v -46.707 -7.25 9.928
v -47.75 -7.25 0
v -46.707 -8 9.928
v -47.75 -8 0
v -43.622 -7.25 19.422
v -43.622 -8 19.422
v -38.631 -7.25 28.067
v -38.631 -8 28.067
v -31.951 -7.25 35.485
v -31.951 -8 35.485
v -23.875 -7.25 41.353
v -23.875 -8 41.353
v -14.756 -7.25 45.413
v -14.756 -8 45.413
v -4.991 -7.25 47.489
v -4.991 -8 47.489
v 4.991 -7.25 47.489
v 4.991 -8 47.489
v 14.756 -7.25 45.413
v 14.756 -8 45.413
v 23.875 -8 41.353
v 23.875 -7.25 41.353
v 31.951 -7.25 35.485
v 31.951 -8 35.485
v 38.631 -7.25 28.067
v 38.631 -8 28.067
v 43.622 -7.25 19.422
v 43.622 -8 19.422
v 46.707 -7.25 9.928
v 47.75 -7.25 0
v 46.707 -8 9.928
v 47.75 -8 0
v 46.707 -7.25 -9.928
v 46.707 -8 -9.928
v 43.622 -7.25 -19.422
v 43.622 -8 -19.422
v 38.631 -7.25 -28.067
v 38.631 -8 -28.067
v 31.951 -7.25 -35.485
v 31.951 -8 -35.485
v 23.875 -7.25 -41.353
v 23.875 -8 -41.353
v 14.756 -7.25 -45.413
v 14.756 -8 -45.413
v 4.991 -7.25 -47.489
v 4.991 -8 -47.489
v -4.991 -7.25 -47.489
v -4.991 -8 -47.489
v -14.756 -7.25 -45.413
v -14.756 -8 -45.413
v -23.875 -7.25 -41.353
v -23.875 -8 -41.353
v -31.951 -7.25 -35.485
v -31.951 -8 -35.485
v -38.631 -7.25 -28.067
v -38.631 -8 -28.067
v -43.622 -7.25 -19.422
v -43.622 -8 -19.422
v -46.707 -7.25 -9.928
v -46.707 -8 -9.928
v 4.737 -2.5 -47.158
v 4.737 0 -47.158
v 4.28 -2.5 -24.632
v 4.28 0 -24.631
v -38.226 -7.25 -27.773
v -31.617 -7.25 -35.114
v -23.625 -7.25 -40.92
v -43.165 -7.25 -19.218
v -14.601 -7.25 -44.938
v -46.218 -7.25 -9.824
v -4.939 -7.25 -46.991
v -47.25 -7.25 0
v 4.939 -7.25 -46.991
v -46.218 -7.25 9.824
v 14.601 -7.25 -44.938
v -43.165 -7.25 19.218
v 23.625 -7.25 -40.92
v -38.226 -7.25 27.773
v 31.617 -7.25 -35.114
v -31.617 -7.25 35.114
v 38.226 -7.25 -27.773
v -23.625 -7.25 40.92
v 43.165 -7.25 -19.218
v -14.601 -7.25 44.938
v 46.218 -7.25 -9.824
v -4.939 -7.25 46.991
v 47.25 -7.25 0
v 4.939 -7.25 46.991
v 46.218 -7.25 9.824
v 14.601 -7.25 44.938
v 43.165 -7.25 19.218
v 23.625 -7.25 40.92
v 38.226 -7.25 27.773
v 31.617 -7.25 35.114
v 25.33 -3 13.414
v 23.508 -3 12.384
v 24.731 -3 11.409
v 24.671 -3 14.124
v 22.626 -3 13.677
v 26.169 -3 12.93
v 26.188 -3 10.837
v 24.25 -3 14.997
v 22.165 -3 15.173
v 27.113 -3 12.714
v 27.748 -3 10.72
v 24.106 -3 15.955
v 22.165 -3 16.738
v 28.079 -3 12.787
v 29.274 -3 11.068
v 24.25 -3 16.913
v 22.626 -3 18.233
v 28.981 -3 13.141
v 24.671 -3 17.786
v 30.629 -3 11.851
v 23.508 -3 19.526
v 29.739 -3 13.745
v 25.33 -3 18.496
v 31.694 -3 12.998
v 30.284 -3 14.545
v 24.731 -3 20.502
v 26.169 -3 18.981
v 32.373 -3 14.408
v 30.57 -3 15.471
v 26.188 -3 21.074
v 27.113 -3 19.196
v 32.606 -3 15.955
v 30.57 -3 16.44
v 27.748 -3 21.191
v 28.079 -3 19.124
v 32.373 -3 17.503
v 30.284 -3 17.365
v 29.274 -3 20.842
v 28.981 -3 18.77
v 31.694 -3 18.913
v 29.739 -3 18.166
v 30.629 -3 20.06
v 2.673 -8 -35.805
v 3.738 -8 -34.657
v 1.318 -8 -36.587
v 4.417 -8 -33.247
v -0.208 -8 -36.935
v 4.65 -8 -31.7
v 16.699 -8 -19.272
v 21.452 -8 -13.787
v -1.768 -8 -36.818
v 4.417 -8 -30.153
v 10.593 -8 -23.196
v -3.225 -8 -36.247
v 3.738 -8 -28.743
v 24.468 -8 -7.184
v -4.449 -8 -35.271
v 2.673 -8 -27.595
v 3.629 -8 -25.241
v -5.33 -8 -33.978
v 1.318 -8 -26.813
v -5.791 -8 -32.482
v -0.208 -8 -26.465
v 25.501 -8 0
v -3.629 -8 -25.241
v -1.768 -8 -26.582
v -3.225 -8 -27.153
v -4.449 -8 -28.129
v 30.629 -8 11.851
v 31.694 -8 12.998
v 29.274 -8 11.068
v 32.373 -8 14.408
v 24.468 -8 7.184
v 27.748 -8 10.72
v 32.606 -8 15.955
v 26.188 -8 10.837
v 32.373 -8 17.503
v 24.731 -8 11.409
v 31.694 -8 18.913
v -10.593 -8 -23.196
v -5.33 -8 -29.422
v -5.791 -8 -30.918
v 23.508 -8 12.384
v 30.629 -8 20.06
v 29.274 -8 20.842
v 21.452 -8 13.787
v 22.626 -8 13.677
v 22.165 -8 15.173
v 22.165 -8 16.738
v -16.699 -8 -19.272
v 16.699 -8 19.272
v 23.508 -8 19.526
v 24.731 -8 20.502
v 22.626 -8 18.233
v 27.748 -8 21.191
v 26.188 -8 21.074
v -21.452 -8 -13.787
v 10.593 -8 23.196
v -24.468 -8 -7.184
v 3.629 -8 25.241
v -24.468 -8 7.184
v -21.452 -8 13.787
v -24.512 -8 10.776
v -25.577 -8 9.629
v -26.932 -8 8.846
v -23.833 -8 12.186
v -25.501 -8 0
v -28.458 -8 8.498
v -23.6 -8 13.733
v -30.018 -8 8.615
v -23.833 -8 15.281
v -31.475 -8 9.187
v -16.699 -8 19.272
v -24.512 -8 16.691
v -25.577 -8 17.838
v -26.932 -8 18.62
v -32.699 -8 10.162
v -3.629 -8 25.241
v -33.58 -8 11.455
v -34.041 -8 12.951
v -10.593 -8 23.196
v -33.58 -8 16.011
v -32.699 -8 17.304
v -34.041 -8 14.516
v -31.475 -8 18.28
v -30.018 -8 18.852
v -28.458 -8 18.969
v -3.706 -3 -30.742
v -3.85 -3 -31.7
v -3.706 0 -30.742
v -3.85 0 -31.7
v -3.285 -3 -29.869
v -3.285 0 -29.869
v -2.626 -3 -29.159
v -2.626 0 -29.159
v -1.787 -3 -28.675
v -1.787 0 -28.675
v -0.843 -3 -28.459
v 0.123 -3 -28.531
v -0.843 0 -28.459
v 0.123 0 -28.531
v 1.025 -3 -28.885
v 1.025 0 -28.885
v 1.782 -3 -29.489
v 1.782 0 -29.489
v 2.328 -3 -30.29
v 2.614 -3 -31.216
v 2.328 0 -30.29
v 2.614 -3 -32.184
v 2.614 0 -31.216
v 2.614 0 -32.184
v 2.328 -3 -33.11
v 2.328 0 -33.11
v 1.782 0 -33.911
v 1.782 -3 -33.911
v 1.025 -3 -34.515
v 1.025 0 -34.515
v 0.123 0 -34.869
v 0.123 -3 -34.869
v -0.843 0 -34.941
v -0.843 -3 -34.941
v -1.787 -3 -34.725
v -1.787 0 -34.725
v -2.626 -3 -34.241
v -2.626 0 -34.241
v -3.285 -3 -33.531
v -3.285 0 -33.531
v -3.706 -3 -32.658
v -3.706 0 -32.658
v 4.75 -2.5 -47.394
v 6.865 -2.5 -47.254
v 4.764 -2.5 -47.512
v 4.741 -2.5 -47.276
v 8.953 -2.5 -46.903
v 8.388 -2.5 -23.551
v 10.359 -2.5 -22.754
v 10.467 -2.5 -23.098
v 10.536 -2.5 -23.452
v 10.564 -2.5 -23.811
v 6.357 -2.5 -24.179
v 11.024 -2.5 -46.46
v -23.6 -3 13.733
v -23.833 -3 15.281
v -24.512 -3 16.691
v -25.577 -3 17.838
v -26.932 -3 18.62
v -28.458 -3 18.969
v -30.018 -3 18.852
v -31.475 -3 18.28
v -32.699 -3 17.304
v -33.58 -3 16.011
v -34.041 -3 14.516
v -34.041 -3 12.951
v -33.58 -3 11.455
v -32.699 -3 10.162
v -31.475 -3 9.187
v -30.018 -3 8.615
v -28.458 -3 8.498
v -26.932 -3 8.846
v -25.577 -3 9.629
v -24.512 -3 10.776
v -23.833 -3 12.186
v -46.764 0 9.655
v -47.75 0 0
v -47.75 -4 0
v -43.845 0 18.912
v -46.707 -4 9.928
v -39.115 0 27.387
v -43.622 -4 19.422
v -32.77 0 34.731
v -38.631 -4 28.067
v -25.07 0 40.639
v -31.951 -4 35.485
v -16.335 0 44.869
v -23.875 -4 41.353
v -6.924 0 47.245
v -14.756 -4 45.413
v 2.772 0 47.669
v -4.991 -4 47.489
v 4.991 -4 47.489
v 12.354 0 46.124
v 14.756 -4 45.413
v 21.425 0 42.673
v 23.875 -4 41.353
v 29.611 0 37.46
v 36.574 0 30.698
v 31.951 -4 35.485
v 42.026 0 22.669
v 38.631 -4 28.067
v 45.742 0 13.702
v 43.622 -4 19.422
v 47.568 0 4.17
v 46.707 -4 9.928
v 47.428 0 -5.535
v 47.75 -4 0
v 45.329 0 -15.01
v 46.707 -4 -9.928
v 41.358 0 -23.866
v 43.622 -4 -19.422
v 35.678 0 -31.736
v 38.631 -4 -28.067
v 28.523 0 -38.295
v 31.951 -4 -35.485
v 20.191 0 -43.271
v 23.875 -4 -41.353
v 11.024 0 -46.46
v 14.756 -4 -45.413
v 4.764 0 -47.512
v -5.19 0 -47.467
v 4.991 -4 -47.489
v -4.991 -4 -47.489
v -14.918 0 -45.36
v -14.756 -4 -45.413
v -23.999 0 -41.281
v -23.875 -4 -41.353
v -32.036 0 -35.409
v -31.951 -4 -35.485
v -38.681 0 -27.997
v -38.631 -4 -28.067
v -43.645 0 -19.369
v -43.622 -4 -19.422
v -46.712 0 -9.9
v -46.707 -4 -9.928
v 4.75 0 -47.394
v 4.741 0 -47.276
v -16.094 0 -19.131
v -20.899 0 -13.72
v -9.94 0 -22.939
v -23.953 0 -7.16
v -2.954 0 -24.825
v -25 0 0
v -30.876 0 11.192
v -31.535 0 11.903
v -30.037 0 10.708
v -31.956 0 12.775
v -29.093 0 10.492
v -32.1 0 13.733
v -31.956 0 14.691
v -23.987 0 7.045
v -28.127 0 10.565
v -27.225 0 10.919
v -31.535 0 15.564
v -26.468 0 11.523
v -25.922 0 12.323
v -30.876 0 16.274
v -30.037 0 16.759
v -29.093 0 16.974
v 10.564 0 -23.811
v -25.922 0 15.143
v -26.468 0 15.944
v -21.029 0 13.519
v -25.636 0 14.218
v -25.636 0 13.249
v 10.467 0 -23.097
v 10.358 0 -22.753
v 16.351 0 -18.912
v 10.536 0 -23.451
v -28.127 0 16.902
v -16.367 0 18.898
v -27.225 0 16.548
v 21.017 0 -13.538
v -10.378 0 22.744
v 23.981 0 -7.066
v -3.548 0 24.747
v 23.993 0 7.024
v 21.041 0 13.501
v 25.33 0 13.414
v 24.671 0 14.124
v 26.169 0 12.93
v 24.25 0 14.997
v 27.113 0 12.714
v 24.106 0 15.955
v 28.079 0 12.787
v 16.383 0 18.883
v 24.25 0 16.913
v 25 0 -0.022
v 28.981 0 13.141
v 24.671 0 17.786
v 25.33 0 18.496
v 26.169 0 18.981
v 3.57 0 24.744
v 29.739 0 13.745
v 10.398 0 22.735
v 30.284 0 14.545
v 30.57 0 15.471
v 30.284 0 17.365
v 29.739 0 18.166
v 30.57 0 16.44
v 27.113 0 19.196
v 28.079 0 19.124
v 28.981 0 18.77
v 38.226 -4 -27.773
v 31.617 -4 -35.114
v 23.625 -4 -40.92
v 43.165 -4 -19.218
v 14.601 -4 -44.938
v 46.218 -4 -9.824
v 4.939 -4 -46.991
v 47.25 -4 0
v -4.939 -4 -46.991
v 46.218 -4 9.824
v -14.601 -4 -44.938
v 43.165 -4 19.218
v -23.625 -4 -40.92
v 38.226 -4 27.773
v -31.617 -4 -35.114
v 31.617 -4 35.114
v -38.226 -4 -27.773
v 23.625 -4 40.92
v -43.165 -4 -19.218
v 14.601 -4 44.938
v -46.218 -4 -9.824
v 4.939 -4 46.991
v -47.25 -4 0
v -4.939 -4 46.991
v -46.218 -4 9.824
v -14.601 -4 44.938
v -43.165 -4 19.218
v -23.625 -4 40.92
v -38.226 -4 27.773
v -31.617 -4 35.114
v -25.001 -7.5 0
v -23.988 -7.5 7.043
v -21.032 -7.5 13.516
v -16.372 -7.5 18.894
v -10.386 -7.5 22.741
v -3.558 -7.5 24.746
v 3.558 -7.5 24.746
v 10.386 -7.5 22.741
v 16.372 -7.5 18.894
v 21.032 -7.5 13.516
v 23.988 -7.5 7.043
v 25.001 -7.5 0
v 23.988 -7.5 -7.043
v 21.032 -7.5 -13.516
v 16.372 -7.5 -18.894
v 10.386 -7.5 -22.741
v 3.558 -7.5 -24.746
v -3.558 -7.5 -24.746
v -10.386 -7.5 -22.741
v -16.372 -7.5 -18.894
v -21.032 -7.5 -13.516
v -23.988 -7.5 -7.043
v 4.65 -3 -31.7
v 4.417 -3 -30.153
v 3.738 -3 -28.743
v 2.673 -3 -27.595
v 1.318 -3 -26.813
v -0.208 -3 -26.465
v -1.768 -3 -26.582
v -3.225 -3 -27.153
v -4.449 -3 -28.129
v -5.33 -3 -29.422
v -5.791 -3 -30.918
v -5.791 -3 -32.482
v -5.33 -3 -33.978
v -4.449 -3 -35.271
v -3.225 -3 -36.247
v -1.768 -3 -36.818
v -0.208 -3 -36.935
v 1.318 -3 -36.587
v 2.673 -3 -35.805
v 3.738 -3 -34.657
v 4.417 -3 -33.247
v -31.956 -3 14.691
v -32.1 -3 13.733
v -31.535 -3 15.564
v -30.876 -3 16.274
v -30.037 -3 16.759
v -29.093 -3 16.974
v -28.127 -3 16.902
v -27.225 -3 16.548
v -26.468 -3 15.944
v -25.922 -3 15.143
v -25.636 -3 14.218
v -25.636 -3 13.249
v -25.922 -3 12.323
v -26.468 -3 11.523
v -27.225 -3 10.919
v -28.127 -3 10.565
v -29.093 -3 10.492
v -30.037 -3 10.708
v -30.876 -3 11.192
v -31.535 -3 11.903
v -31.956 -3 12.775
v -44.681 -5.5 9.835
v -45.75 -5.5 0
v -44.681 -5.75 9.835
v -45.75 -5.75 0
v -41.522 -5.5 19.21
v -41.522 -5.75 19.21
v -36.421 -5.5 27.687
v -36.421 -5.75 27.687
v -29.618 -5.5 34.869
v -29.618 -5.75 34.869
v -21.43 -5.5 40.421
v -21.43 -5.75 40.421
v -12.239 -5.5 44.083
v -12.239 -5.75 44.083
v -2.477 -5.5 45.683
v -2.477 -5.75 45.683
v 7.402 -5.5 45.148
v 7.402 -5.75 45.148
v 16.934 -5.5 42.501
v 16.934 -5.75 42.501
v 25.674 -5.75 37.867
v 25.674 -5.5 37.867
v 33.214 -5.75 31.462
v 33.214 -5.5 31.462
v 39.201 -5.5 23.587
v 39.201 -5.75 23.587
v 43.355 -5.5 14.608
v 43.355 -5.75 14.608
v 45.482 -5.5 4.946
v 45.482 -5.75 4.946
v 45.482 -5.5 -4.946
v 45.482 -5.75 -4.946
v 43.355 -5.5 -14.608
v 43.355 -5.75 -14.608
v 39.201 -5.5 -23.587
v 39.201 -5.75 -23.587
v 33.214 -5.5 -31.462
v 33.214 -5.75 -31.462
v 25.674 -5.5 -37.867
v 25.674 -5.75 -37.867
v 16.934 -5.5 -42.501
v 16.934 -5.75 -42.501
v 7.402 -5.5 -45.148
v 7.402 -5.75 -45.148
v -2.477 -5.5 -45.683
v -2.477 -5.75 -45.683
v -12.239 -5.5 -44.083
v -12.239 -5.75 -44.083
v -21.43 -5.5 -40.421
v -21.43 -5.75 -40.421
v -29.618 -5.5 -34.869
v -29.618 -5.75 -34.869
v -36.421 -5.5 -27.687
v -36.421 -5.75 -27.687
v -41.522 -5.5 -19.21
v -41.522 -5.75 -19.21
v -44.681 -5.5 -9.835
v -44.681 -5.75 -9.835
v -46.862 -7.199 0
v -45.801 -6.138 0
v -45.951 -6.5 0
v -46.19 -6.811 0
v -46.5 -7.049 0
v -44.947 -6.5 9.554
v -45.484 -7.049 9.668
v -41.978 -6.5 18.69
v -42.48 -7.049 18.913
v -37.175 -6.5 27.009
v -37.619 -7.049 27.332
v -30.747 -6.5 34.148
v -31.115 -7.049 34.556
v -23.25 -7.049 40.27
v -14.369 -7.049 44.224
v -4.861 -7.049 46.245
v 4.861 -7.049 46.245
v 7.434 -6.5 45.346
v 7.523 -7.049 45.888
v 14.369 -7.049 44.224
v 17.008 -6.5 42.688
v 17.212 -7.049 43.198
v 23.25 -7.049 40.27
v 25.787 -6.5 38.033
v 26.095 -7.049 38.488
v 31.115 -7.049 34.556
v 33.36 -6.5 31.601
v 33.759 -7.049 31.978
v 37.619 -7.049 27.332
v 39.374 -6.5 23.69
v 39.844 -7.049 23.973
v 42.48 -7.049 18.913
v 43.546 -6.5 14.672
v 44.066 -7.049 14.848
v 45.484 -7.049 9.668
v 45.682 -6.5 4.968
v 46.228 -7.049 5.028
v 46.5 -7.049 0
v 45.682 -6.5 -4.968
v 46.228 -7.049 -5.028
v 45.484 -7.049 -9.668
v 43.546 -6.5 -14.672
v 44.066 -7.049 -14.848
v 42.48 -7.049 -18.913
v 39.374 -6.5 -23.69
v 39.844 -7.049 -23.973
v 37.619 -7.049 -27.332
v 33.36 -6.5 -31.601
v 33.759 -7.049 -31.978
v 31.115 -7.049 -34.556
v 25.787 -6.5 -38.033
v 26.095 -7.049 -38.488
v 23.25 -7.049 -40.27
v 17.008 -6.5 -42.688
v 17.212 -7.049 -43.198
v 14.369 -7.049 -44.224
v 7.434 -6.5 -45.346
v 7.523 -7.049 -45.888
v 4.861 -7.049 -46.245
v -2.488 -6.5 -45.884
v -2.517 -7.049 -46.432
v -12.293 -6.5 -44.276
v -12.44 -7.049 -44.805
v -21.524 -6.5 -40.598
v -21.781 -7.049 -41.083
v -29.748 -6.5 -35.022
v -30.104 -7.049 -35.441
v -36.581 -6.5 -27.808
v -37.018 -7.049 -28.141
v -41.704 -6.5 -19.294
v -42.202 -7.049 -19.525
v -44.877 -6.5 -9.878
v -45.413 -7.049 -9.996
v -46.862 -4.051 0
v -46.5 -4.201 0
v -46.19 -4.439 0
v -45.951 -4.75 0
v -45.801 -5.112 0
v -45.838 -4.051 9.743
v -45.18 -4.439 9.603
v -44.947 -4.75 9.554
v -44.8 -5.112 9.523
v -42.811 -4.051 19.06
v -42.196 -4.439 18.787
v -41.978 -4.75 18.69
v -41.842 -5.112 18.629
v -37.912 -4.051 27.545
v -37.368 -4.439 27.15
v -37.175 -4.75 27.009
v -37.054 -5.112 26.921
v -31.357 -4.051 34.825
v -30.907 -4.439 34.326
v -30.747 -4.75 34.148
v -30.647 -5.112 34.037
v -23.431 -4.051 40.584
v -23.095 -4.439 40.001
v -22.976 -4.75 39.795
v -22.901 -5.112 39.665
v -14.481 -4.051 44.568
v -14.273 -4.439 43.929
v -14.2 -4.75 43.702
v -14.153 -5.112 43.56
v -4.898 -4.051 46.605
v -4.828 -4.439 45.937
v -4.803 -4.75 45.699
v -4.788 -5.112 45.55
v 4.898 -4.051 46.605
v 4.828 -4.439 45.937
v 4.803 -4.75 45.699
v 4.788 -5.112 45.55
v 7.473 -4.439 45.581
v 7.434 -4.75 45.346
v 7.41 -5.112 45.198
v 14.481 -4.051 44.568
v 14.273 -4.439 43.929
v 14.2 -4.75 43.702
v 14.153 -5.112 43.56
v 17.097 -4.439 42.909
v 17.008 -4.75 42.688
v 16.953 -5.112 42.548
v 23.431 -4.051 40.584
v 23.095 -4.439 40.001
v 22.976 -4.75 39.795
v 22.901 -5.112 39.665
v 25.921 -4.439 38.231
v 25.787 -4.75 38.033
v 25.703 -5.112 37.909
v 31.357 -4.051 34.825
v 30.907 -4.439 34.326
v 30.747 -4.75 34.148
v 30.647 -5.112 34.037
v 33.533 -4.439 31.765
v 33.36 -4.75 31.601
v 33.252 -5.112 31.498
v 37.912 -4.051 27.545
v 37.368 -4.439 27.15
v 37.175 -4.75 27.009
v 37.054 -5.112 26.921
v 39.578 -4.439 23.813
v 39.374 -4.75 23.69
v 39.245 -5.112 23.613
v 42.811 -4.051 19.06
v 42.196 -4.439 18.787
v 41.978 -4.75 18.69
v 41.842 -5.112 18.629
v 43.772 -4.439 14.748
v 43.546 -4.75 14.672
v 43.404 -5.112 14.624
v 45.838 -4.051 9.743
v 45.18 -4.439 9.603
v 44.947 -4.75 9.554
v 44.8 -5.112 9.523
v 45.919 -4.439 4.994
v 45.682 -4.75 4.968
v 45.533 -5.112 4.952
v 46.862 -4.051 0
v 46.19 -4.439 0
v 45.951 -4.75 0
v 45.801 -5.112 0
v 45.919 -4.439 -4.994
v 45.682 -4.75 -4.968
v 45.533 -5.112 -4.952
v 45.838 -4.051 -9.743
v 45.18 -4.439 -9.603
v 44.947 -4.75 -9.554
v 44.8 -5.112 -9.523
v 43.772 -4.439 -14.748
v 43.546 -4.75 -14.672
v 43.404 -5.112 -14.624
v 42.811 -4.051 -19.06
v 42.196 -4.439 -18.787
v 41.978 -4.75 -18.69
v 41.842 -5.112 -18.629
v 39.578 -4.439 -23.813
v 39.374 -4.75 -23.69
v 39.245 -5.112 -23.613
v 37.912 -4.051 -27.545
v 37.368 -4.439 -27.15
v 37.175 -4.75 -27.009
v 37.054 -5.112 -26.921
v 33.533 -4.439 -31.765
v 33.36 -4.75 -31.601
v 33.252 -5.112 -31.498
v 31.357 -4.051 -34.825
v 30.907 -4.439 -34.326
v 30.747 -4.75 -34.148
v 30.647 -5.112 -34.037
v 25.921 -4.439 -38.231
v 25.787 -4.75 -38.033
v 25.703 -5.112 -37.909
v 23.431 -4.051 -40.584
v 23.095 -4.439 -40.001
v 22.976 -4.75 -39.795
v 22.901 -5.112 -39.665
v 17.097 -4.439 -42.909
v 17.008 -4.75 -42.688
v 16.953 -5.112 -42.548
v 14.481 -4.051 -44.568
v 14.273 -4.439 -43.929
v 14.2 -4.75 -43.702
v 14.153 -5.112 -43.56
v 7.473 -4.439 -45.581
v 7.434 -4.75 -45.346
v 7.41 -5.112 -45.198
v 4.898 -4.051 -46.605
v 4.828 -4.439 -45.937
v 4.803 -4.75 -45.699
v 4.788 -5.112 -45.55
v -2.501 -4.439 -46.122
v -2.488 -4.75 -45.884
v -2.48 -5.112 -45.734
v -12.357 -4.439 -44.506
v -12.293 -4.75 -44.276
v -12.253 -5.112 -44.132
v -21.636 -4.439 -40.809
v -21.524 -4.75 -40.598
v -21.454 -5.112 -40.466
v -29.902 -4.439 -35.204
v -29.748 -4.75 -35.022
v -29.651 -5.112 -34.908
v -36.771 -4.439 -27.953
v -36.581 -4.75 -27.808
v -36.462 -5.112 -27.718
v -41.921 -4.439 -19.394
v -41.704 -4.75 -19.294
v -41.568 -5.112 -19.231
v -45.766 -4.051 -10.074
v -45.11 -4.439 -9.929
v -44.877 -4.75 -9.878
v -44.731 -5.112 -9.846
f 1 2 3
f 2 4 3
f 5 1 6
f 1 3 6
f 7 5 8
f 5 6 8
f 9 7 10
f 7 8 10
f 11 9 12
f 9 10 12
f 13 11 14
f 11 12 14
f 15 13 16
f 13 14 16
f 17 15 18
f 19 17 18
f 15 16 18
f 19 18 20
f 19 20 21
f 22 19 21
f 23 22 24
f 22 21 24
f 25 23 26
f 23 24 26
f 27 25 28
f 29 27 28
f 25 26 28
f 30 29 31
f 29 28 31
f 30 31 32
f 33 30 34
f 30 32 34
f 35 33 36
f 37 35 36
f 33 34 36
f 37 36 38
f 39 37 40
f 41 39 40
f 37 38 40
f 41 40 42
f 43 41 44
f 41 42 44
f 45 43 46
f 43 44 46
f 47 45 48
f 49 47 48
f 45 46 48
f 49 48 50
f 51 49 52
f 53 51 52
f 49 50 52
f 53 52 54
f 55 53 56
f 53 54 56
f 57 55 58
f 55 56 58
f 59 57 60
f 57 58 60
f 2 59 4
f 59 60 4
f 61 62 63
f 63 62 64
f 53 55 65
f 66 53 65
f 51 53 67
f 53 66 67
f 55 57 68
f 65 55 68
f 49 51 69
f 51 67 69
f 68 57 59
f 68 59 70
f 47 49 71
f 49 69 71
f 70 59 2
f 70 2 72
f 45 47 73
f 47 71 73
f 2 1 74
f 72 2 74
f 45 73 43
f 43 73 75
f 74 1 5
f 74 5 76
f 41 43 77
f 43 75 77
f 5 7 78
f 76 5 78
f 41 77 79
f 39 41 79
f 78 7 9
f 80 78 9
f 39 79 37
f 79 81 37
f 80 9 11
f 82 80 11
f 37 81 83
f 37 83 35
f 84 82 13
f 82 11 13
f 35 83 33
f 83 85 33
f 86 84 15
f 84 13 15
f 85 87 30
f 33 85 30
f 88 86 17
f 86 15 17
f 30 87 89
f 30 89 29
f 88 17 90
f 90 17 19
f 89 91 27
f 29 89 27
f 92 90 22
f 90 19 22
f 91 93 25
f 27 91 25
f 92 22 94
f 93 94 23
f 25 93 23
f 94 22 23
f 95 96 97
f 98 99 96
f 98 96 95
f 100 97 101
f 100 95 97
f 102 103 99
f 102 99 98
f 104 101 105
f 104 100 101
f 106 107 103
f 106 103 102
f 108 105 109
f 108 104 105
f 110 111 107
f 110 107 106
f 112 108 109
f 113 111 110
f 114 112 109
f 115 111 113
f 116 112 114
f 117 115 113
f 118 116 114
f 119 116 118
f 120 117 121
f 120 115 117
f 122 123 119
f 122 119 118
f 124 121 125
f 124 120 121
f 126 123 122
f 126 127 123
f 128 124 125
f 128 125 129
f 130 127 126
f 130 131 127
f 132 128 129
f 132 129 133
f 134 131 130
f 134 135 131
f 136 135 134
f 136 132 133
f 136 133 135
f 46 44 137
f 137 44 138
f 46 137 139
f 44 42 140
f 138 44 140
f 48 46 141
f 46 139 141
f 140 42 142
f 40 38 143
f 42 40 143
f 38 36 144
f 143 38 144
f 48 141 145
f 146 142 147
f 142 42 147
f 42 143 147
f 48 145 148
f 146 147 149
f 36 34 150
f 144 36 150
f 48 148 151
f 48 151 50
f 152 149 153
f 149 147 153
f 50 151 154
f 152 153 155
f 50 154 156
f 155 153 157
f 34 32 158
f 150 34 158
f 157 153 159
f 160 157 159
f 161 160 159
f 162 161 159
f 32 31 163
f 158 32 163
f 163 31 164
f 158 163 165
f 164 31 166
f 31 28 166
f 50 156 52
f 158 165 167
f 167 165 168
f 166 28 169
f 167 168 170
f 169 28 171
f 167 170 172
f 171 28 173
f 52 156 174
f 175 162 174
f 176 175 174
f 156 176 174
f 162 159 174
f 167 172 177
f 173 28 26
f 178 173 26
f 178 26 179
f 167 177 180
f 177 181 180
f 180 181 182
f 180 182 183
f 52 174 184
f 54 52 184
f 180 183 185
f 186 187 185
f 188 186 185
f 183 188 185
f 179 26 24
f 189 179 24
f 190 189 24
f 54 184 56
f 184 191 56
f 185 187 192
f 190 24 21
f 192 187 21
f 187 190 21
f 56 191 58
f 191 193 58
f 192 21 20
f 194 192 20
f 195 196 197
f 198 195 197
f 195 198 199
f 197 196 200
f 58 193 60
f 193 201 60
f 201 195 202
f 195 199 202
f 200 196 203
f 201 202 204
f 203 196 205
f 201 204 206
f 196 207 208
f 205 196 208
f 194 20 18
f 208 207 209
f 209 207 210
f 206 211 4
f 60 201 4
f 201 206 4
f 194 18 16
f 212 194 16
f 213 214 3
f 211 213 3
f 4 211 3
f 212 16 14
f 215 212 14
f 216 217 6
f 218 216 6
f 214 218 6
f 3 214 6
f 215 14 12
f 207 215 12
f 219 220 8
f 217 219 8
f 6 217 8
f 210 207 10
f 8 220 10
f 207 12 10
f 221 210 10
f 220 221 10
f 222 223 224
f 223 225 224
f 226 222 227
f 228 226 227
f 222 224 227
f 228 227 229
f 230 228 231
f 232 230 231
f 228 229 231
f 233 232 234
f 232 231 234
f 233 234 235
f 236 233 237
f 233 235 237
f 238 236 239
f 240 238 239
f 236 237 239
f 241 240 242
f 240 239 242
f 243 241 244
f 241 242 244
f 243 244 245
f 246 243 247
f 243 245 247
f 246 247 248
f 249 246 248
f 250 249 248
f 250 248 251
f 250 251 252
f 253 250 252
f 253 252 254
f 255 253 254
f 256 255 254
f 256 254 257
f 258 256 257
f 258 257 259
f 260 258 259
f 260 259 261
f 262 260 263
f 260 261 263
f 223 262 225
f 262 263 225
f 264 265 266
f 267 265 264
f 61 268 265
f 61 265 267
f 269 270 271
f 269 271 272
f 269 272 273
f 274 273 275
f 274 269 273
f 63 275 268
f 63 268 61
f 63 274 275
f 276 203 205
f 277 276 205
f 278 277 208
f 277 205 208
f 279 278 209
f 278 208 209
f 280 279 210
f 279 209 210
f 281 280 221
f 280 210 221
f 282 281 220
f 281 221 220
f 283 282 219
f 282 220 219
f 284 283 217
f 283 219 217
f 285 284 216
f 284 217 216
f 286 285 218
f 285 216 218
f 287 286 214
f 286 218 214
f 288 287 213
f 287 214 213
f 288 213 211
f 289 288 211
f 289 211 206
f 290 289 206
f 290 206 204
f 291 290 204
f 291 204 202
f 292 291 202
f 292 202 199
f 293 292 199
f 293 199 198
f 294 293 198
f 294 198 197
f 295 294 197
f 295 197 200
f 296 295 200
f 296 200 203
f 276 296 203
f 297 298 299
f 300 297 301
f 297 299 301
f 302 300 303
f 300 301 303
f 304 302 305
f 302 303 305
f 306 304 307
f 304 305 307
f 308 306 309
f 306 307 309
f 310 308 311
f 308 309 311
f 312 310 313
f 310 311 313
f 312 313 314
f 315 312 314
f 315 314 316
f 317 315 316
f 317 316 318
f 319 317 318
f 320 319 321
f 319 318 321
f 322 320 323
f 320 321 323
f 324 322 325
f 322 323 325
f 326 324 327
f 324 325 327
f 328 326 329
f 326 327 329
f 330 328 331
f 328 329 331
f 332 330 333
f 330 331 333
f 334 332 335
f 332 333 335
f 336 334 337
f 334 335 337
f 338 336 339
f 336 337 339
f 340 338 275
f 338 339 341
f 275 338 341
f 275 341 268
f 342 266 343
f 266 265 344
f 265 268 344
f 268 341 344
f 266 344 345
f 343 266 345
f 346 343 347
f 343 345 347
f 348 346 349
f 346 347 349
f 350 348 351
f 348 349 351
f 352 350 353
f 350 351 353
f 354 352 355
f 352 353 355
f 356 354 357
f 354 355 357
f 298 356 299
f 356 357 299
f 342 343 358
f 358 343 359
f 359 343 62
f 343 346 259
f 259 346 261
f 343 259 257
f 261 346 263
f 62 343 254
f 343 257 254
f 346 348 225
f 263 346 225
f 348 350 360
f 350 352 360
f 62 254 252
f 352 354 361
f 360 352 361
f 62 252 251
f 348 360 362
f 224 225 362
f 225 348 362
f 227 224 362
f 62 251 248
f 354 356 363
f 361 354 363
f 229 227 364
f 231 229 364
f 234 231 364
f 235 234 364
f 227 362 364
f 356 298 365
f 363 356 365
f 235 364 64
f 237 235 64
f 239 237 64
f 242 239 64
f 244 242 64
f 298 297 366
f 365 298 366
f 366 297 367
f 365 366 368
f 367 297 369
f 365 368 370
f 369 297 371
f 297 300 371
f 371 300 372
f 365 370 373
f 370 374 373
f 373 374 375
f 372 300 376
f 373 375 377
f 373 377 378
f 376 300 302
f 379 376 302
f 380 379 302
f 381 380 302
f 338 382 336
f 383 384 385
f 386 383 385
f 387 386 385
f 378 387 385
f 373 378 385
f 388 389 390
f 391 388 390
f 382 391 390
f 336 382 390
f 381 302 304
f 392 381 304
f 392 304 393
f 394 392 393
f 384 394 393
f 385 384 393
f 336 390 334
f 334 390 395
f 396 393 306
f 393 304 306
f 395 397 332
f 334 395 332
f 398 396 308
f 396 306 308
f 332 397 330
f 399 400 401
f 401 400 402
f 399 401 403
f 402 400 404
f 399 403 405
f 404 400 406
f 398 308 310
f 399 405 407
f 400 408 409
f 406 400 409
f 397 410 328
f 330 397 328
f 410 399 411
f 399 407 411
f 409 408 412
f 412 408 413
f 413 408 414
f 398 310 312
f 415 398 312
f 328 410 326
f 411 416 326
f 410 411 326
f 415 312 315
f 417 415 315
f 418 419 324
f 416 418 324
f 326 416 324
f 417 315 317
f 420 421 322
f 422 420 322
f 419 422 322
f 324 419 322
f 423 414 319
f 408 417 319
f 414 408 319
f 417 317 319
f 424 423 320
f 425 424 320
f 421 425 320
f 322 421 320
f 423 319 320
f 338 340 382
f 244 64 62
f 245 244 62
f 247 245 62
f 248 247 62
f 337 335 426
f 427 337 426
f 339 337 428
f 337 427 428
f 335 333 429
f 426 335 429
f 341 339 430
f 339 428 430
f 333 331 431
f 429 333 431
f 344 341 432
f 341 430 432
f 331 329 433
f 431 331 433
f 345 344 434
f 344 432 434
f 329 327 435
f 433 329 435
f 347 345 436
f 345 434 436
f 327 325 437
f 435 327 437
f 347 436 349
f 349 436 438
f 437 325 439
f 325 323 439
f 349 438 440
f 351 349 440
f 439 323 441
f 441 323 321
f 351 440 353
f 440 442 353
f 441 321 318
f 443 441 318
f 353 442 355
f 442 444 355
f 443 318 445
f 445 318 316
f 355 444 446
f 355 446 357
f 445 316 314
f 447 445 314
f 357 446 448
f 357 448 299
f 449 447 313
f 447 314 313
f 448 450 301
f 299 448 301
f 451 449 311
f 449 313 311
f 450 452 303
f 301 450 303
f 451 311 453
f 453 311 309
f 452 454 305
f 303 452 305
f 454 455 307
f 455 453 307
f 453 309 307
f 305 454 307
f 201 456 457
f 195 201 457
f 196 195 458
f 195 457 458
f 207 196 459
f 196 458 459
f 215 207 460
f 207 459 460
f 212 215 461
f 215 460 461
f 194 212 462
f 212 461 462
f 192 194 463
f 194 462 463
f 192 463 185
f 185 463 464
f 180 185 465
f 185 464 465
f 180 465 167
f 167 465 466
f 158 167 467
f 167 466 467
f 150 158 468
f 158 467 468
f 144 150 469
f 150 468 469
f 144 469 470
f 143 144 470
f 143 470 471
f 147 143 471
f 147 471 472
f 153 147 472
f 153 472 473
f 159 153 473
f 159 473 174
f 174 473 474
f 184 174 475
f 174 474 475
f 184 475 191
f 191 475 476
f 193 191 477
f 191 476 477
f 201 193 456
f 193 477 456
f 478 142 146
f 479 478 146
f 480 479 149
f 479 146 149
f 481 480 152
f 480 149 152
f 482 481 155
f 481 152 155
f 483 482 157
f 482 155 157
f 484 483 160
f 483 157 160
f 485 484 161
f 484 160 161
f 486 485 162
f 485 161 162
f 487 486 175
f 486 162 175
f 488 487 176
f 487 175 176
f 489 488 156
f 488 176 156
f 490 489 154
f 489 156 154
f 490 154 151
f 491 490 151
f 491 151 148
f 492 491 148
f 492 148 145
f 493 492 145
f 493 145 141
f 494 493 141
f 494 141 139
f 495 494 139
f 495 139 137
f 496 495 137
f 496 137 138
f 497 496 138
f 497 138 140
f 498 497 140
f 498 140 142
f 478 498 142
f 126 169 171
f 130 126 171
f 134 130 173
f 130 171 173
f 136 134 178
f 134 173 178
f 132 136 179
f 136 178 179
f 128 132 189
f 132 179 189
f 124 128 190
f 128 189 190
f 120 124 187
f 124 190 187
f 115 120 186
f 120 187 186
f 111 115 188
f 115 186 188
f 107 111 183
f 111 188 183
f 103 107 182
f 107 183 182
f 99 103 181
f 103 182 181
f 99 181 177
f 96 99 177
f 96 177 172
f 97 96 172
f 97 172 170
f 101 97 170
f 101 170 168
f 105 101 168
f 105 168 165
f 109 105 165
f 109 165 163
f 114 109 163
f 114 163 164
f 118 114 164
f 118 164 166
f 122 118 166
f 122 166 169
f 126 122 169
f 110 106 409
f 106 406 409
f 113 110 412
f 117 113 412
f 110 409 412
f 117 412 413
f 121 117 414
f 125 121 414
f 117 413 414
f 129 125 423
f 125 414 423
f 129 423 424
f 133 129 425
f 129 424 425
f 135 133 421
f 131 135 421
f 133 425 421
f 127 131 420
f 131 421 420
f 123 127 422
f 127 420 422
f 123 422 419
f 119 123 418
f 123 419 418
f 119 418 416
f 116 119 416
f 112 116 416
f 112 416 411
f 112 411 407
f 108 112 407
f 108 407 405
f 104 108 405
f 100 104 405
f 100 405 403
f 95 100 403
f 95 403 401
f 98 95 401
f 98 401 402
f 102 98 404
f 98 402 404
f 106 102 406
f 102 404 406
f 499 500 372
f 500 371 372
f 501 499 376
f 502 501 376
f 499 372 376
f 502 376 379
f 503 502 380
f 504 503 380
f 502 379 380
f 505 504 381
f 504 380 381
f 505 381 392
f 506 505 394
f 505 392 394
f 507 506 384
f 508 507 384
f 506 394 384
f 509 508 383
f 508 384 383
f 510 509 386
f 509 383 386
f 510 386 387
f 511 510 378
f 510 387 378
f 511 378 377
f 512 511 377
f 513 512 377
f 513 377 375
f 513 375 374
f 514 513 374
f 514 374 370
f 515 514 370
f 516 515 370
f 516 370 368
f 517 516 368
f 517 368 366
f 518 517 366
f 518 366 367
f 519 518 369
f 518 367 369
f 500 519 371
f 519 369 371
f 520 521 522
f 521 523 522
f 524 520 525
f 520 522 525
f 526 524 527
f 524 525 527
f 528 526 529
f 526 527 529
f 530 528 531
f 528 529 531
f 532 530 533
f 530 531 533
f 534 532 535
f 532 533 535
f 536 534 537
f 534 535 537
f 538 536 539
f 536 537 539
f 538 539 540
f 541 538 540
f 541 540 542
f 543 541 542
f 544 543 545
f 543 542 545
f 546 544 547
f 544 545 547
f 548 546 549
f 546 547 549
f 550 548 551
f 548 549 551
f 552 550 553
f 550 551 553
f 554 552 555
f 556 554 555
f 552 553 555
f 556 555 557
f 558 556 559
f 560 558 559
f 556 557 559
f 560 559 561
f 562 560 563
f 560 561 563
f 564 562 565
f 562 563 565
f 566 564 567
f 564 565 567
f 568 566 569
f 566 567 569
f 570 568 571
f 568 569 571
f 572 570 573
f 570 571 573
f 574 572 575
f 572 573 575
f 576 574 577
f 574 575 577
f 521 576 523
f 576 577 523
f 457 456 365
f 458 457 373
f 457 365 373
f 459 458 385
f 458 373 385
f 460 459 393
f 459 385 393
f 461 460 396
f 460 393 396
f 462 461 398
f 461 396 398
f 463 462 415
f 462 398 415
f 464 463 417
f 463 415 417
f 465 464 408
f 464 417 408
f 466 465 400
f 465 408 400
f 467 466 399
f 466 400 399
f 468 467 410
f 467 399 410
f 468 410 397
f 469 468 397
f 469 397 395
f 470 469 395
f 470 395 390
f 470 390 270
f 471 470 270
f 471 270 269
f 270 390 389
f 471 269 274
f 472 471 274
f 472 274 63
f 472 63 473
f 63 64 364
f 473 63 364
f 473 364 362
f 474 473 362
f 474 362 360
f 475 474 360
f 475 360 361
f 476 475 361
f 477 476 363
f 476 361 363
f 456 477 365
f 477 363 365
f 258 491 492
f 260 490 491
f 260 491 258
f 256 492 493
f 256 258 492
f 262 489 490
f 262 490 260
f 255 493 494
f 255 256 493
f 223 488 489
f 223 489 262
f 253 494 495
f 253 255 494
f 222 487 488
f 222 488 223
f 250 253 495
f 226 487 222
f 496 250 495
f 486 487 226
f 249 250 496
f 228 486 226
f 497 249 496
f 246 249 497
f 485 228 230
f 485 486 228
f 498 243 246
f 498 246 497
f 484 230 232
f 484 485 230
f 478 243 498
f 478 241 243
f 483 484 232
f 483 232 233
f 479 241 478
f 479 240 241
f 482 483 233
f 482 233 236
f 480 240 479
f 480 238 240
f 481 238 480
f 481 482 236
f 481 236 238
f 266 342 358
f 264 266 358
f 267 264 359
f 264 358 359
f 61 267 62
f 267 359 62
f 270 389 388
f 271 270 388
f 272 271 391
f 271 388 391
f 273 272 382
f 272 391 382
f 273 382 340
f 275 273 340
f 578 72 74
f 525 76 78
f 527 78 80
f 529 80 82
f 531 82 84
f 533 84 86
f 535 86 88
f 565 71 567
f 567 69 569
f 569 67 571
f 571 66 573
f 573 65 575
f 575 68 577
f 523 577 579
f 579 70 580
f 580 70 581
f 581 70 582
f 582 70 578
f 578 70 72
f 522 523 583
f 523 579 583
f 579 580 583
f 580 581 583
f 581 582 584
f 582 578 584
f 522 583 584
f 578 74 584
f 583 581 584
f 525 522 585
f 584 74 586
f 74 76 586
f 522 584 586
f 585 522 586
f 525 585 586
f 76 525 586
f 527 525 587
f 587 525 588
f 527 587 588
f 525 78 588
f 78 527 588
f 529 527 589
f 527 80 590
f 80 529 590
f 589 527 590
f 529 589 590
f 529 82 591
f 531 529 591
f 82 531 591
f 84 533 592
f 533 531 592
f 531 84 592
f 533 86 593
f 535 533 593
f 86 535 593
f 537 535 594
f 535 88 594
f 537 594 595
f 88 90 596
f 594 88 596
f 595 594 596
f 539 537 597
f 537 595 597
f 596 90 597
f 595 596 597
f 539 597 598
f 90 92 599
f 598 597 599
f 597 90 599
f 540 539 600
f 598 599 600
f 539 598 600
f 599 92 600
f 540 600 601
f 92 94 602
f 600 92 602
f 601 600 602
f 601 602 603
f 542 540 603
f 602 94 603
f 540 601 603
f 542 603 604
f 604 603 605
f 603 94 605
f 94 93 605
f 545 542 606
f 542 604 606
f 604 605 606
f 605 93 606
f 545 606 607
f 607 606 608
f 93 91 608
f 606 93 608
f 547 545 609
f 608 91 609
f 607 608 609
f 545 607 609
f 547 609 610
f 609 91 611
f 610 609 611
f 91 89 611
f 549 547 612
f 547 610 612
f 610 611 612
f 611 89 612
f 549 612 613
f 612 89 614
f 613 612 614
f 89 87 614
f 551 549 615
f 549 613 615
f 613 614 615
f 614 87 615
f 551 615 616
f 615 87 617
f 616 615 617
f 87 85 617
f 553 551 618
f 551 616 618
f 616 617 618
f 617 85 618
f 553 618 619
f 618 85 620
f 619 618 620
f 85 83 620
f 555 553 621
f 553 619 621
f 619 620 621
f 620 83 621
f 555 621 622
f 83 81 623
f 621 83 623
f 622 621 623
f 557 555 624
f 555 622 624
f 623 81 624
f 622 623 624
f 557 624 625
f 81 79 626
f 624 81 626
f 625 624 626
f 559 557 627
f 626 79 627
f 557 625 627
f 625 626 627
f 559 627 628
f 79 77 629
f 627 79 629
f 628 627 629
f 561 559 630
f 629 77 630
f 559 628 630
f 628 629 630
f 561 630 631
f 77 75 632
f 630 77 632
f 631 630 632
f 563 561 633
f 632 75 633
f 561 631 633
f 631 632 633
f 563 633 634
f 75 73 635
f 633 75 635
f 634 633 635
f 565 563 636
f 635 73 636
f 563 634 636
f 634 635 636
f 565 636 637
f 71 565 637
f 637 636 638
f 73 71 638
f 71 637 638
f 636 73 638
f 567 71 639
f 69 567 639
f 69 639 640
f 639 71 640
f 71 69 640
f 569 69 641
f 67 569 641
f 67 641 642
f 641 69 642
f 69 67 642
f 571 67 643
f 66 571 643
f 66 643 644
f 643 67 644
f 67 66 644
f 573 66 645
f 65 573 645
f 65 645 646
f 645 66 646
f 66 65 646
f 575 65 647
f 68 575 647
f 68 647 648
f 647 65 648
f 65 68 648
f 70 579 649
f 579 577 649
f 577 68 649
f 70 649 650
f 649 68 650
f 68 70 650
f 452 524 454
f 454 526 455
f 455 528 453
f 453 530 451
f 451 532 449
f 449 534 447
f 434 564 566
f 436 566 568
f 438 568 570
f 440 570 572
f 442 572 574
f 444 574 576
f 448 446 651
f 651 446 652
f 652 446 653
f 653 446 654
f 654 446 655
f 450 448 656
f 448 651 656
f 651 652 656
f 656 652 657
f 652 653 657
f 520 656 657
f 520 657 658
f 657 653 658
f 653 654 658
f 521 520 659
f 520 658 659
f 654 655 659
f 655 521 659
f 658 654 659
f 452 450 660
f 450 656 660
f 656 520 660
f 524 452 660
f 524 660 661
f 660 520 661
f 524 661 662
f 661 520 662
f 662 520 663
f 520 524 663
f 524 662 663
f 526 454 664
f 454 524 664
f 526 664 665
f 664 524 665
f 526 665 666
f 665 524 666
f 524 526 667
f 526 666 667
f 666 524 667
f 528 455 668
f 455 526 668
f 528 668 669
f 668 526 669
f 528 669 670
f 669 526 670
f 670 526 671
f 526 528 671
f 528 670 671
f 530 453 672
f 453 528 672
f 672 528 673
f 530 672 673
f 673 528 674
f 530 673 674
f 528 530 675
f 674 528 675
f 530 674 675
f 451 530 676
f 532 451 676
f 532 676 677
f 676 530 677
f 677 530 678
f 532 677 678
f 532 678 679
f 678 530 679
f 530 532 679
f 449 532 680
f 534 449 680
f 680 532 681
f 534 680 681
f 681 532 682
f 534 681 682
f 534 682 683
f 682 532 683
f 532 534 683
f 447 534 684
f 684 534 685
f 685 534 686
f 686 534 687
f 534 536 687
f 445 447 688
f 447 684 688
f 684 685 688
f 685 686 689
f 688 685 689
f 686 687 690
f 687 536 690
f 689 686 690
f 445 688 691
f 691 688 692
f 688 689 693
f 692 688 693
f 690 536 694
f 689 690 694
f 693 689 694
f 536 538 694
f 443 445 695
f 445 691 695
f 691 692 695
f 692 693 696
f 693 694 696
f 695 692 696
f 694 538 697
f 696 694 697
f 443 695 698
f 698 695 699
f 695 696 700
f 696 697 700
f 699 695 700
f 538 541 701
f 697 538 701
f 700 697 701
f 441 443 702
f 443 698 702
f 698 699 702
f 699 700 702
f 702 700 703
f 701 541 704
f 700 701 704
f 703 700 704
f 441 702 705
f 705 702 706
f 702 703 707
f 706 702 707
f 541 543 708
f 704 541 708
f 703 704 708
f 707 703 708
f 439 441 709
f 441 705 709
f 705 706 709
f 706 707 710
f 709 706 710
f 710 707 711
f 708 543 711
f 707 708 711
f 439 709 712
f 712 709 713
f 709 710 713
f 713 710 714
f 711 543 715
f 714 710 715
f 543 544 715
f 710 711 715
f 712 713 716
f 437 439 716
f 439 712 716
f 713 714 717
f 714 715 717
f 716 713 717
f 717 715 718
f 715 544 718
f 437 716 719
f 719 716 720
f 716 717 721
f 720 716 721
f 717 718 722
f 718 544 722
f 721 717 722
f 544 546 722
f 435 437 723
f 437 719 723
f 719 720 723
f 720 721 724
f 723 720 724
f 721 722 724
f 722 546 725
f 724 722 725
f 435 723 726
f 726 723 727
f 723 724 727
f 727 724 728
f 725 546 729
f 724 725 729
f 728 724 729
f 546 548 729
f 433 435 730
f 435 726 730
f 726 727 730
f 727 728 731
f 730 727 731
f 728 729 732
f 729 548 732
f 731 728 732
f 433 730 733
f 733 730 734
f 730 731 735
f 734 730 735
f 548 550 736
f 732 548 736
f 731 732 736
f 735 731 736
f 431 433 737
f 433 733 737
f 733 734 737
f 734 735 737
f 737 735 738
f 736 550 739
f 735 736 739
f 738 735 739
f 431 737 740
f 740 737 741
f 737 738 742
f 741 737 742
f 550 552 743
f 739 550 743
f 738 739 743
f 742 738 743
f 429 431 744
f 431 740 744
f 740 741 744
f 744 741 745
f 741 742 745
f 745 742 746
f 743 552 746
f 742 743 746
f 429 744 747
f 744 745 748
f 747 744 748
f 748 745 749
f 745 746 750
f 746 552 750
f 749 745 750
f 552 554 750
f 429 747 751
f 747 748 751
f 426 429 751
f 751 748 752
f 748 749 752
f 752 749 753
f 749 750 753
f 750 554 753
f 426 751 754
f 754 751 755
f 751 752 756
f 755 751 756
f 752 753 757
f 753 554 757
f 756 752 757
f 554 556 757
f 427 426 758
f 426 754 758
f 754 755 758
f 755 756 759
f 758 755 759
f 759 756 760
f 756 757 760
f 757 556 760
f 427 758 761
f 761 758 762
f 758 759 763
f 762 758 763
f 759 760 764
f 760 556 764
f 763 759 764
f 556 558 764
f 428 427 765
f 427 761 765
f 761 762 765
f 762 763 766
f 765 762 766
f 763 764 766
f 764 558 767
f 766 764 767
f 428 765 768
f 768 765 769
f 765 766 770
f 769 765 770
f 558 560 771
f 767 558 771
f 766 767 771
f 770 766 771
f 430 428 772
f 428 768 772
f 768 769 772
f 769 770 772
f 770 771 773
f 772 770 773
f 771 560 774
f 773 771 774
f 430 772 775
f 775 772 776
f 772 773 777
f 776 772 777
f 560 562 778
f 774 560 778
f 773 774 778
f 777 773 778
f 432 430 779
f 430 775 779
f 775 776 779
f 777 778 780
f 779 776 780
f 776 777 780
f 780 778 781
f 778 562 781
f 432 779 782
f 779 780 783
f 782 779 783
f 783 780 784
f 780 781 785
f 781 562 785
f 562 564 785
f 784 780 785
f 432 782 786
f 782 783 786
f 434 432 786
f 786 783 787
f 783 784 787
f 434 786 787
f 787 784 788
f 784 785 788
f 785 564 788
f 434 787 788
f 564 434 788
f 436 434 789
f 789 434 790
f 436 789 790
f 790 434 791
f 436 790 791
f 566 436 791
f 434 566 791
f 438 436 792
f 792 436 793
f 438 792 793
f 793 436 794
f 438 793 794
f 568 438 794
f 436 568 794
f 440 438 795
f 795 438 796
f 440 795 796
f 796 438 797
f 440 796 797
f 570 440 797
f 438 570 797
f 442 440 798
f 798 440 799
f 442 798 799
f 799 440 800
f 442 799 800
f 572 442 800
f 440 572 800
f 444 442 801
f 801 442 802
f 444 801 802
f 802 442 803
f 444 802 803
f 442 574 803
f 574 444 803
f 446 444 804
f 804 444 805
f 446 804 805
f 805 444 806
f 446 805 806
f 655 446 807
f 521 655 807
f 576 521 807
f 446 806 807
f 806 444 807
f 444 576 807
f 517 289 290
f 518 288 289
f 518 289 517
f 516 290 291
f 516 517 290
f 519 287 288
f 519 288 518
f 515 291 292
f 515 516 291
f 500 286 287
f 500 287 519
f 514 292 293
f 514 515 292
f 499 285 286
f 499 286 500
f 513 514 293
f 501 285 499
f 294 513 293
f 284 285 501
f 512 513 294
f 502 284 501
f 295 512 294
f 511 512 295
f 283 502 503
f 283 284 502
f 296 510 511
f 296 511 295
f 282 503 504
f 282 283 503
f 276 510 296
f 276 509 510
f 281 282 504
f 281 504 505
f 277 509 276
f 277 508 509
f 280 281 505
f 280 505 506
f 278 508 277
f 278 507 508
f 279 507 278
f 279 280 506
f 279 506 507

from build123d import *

# Parameters (mm, degrees)
F2_SIZE        = 0.5
F4_DEPTH       = 2.5
F6_D           = 6.5
F6_CBORE_D     = 10.5
F6_CBORE_DEPTH = 5


with BuildPart() as f1:
    # F0 (on Top) → F1 (revolve)
    with BuildSketch(Plane.XY):
        with BuildLine():
            Line((-47.750211, -7.25), (-47.750212, -8))
            Line((-47.750212, -8), (-25.000581, -8))
            Line((-25.000581, -8), (-25, 0))
            Line((-25, 0), (-47.75, 0))
            Line((-47.75, 0), (-47.75019, -4))
            Line((-47.75019, -4), (-47.250211, -4))
            ThreePointArc((-47.250211, -4), (-46.189551, -4.43934), (-45.750211, -5.5))
            Line((-45.750211, -5.5), (-45.750211, -5.75))
            ThreePointArc((-45.750211, -5.75), (-46.189551, -6.81066), (-47.250211, -7.25))
            Line((-47.250211, -7.25), (-47.750211, -7.25))
        make_face()
    revolve(axis=Axis((0, 4.349666, 0), (0, 1, 0)))

    # F2
    f2_edges = [f1.edges().sort_by_distance(p)[0] for p in [
        (25.000581, -8, 0),
    ]]
    chamfer(f2_edges, length=F2_SIZE)

    # F3 (on face) → F4 (cut)
    with BuildSketch(Plane(origin=(0, 0, 0), x_dir=(-1, 0, 0), z_dir=(0, 1, 0))):
        with BuildLine():
            ThreePointArc((-4.265587, -23.938974), (-7.351028, -20.725712), (-10.56429, -23.811154))
            Line((-10.56429, -23.811154), (-11.035483, -47.030372))
            ThreePointArc((-11.035483, -47.030372), (-7.950042, -50.243634), (-4.73678, -47.158193))
            Line((-4.73678, -47.158193), (-4.265587, -23.938974))
        make_face()
    extrude(amount=-F4_DEPTH, mode=Mode.SUBTRACT)

    # F6 (through all)
    with Locations(Plane.XZ.offset(8)):
        with Locations((-28.85, 13.73333), (27.356101, 15.955209), (-0.6, -31.7)):
            CounterBoreHole(F6_D / 2, F6_CBORE_D / 2, F6_CBORE_DEPTH)


solid = f1.part
